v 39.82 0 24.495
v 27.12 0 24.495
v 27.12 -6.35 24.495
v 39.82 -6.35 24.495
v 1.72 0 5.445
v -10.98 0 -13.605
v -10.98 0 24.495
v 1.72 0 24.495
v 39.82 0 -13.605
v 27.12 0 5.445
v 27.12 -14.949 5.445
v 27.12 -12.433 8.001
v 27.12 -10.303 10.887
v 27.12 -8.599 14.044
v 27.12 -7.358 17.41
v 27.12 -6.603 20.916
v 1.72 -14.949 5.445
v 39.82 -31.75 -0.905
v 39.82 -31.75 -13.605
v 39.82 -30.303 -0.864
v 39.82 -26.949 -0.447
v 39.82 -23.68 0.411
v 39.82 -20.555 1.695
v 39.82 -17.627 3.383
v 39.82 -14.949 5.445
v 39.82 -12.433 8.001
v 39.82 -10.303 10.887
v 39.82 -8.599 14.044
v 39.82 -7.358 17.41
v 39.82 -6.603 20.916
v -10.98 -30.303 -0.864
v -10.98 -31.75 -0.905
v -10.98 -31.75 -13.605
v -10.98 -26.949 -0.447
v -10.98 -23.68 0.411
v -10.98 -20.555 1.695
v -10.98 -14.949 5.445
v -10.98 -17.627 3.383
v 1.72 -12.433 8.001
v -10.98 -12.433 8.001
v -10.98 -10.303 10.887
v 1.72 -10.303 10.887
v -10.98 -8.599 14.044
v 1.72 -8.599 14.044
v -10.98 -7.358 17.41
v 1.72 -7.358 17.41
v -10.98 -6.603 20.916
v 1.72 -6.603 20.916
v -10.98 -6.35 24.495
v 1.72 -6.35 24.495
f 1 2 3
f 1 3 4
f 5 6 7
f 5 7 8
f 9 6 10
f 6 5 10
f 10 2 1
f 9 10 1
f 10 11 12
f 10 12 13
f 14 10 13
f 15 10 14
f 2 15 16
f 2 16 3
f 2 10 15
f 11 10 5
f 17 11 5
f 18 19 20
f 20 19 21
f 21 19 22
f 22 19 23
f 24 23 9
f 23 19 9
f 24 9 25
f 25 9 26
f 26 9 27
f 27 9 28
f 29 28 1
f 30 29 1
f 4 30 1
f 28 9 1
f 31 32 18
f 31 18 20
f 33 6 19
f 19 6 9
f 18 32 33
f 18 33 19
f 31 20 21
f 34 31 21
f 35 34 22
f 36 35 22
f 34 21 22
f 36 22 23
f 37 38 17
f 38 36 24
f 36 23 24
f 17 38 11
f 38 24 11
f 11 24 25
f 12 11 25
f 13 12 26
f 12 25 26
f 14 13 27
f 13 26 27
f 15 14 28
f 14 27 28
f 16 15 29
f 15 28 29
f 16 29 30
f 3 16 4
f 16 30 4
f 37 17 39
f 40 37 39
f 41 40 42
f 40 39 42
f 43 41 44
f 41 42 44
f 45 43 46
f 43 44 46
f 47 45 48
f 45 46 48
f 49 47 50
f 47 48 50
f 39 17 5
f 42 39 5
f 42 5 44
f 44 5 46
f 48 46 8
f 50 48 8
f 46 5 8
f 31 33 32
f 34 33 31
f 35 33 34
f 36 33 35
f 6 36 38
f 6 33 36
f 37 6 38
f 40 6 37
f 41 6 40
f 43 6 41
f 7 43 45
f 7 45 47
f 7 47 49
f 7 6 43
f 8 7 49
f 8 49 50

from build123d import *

# Parameters (mm, degrees)
F0_W     = 50.8
F0_H     = 38.1
F1_DEPTH = 31.75
F3_DEPTH = 254
F4_W     = 25.4
F4_H     = 19.05
F5_DEPTH = 25.4


with BuildPart() as f1:
    # F0 (on Front) → F1 (new body)
    with BuildSketch(Plane.XZ):
        with Locations((14.420407, 5.444671)):
            Rectangle(F0_W, F0_H)
    extrude(amount=F1_DEPTH)

    # F2 (on face) → F3 (cut)
    with BuildSketch(Plane.YZ.offset(39.820407)):
        with BuildLine():
            ThreePointArc((-30.30265, -0.864059), (-22.096181, 1.000761), (-14.949479, 5.444671))
            ThreePointArc((-14.949479, 5.444671), (-8.599479, 14.04415), (-6.35, 24.494671))
            Line((-6.35, 24.494671), (-31.75, 24.494671))
            Line((-31.75, 24.494671), (-31.75, -0.905329))
            Line((-31.75, -0.905329), (-30.30265, -0.864059))
        make_face()
    extrude(amount=-F3_DEPTH, mode=Mode.SUBTRACT)

    # F4 (on face) → F5 (cut)
    with BuildSketch(Plane(origin=(0, 0, 0), x_dir=(-1, 0, 0), z_dir=(0, 1, 0))):
        with Locations((-14.420407, 14.969671)):
            Rectangle(F4_W, F4_H)
    extrude(amount=-F5_DEPTH, mode=Mode.SUBTRACT)


solid = f1.part
